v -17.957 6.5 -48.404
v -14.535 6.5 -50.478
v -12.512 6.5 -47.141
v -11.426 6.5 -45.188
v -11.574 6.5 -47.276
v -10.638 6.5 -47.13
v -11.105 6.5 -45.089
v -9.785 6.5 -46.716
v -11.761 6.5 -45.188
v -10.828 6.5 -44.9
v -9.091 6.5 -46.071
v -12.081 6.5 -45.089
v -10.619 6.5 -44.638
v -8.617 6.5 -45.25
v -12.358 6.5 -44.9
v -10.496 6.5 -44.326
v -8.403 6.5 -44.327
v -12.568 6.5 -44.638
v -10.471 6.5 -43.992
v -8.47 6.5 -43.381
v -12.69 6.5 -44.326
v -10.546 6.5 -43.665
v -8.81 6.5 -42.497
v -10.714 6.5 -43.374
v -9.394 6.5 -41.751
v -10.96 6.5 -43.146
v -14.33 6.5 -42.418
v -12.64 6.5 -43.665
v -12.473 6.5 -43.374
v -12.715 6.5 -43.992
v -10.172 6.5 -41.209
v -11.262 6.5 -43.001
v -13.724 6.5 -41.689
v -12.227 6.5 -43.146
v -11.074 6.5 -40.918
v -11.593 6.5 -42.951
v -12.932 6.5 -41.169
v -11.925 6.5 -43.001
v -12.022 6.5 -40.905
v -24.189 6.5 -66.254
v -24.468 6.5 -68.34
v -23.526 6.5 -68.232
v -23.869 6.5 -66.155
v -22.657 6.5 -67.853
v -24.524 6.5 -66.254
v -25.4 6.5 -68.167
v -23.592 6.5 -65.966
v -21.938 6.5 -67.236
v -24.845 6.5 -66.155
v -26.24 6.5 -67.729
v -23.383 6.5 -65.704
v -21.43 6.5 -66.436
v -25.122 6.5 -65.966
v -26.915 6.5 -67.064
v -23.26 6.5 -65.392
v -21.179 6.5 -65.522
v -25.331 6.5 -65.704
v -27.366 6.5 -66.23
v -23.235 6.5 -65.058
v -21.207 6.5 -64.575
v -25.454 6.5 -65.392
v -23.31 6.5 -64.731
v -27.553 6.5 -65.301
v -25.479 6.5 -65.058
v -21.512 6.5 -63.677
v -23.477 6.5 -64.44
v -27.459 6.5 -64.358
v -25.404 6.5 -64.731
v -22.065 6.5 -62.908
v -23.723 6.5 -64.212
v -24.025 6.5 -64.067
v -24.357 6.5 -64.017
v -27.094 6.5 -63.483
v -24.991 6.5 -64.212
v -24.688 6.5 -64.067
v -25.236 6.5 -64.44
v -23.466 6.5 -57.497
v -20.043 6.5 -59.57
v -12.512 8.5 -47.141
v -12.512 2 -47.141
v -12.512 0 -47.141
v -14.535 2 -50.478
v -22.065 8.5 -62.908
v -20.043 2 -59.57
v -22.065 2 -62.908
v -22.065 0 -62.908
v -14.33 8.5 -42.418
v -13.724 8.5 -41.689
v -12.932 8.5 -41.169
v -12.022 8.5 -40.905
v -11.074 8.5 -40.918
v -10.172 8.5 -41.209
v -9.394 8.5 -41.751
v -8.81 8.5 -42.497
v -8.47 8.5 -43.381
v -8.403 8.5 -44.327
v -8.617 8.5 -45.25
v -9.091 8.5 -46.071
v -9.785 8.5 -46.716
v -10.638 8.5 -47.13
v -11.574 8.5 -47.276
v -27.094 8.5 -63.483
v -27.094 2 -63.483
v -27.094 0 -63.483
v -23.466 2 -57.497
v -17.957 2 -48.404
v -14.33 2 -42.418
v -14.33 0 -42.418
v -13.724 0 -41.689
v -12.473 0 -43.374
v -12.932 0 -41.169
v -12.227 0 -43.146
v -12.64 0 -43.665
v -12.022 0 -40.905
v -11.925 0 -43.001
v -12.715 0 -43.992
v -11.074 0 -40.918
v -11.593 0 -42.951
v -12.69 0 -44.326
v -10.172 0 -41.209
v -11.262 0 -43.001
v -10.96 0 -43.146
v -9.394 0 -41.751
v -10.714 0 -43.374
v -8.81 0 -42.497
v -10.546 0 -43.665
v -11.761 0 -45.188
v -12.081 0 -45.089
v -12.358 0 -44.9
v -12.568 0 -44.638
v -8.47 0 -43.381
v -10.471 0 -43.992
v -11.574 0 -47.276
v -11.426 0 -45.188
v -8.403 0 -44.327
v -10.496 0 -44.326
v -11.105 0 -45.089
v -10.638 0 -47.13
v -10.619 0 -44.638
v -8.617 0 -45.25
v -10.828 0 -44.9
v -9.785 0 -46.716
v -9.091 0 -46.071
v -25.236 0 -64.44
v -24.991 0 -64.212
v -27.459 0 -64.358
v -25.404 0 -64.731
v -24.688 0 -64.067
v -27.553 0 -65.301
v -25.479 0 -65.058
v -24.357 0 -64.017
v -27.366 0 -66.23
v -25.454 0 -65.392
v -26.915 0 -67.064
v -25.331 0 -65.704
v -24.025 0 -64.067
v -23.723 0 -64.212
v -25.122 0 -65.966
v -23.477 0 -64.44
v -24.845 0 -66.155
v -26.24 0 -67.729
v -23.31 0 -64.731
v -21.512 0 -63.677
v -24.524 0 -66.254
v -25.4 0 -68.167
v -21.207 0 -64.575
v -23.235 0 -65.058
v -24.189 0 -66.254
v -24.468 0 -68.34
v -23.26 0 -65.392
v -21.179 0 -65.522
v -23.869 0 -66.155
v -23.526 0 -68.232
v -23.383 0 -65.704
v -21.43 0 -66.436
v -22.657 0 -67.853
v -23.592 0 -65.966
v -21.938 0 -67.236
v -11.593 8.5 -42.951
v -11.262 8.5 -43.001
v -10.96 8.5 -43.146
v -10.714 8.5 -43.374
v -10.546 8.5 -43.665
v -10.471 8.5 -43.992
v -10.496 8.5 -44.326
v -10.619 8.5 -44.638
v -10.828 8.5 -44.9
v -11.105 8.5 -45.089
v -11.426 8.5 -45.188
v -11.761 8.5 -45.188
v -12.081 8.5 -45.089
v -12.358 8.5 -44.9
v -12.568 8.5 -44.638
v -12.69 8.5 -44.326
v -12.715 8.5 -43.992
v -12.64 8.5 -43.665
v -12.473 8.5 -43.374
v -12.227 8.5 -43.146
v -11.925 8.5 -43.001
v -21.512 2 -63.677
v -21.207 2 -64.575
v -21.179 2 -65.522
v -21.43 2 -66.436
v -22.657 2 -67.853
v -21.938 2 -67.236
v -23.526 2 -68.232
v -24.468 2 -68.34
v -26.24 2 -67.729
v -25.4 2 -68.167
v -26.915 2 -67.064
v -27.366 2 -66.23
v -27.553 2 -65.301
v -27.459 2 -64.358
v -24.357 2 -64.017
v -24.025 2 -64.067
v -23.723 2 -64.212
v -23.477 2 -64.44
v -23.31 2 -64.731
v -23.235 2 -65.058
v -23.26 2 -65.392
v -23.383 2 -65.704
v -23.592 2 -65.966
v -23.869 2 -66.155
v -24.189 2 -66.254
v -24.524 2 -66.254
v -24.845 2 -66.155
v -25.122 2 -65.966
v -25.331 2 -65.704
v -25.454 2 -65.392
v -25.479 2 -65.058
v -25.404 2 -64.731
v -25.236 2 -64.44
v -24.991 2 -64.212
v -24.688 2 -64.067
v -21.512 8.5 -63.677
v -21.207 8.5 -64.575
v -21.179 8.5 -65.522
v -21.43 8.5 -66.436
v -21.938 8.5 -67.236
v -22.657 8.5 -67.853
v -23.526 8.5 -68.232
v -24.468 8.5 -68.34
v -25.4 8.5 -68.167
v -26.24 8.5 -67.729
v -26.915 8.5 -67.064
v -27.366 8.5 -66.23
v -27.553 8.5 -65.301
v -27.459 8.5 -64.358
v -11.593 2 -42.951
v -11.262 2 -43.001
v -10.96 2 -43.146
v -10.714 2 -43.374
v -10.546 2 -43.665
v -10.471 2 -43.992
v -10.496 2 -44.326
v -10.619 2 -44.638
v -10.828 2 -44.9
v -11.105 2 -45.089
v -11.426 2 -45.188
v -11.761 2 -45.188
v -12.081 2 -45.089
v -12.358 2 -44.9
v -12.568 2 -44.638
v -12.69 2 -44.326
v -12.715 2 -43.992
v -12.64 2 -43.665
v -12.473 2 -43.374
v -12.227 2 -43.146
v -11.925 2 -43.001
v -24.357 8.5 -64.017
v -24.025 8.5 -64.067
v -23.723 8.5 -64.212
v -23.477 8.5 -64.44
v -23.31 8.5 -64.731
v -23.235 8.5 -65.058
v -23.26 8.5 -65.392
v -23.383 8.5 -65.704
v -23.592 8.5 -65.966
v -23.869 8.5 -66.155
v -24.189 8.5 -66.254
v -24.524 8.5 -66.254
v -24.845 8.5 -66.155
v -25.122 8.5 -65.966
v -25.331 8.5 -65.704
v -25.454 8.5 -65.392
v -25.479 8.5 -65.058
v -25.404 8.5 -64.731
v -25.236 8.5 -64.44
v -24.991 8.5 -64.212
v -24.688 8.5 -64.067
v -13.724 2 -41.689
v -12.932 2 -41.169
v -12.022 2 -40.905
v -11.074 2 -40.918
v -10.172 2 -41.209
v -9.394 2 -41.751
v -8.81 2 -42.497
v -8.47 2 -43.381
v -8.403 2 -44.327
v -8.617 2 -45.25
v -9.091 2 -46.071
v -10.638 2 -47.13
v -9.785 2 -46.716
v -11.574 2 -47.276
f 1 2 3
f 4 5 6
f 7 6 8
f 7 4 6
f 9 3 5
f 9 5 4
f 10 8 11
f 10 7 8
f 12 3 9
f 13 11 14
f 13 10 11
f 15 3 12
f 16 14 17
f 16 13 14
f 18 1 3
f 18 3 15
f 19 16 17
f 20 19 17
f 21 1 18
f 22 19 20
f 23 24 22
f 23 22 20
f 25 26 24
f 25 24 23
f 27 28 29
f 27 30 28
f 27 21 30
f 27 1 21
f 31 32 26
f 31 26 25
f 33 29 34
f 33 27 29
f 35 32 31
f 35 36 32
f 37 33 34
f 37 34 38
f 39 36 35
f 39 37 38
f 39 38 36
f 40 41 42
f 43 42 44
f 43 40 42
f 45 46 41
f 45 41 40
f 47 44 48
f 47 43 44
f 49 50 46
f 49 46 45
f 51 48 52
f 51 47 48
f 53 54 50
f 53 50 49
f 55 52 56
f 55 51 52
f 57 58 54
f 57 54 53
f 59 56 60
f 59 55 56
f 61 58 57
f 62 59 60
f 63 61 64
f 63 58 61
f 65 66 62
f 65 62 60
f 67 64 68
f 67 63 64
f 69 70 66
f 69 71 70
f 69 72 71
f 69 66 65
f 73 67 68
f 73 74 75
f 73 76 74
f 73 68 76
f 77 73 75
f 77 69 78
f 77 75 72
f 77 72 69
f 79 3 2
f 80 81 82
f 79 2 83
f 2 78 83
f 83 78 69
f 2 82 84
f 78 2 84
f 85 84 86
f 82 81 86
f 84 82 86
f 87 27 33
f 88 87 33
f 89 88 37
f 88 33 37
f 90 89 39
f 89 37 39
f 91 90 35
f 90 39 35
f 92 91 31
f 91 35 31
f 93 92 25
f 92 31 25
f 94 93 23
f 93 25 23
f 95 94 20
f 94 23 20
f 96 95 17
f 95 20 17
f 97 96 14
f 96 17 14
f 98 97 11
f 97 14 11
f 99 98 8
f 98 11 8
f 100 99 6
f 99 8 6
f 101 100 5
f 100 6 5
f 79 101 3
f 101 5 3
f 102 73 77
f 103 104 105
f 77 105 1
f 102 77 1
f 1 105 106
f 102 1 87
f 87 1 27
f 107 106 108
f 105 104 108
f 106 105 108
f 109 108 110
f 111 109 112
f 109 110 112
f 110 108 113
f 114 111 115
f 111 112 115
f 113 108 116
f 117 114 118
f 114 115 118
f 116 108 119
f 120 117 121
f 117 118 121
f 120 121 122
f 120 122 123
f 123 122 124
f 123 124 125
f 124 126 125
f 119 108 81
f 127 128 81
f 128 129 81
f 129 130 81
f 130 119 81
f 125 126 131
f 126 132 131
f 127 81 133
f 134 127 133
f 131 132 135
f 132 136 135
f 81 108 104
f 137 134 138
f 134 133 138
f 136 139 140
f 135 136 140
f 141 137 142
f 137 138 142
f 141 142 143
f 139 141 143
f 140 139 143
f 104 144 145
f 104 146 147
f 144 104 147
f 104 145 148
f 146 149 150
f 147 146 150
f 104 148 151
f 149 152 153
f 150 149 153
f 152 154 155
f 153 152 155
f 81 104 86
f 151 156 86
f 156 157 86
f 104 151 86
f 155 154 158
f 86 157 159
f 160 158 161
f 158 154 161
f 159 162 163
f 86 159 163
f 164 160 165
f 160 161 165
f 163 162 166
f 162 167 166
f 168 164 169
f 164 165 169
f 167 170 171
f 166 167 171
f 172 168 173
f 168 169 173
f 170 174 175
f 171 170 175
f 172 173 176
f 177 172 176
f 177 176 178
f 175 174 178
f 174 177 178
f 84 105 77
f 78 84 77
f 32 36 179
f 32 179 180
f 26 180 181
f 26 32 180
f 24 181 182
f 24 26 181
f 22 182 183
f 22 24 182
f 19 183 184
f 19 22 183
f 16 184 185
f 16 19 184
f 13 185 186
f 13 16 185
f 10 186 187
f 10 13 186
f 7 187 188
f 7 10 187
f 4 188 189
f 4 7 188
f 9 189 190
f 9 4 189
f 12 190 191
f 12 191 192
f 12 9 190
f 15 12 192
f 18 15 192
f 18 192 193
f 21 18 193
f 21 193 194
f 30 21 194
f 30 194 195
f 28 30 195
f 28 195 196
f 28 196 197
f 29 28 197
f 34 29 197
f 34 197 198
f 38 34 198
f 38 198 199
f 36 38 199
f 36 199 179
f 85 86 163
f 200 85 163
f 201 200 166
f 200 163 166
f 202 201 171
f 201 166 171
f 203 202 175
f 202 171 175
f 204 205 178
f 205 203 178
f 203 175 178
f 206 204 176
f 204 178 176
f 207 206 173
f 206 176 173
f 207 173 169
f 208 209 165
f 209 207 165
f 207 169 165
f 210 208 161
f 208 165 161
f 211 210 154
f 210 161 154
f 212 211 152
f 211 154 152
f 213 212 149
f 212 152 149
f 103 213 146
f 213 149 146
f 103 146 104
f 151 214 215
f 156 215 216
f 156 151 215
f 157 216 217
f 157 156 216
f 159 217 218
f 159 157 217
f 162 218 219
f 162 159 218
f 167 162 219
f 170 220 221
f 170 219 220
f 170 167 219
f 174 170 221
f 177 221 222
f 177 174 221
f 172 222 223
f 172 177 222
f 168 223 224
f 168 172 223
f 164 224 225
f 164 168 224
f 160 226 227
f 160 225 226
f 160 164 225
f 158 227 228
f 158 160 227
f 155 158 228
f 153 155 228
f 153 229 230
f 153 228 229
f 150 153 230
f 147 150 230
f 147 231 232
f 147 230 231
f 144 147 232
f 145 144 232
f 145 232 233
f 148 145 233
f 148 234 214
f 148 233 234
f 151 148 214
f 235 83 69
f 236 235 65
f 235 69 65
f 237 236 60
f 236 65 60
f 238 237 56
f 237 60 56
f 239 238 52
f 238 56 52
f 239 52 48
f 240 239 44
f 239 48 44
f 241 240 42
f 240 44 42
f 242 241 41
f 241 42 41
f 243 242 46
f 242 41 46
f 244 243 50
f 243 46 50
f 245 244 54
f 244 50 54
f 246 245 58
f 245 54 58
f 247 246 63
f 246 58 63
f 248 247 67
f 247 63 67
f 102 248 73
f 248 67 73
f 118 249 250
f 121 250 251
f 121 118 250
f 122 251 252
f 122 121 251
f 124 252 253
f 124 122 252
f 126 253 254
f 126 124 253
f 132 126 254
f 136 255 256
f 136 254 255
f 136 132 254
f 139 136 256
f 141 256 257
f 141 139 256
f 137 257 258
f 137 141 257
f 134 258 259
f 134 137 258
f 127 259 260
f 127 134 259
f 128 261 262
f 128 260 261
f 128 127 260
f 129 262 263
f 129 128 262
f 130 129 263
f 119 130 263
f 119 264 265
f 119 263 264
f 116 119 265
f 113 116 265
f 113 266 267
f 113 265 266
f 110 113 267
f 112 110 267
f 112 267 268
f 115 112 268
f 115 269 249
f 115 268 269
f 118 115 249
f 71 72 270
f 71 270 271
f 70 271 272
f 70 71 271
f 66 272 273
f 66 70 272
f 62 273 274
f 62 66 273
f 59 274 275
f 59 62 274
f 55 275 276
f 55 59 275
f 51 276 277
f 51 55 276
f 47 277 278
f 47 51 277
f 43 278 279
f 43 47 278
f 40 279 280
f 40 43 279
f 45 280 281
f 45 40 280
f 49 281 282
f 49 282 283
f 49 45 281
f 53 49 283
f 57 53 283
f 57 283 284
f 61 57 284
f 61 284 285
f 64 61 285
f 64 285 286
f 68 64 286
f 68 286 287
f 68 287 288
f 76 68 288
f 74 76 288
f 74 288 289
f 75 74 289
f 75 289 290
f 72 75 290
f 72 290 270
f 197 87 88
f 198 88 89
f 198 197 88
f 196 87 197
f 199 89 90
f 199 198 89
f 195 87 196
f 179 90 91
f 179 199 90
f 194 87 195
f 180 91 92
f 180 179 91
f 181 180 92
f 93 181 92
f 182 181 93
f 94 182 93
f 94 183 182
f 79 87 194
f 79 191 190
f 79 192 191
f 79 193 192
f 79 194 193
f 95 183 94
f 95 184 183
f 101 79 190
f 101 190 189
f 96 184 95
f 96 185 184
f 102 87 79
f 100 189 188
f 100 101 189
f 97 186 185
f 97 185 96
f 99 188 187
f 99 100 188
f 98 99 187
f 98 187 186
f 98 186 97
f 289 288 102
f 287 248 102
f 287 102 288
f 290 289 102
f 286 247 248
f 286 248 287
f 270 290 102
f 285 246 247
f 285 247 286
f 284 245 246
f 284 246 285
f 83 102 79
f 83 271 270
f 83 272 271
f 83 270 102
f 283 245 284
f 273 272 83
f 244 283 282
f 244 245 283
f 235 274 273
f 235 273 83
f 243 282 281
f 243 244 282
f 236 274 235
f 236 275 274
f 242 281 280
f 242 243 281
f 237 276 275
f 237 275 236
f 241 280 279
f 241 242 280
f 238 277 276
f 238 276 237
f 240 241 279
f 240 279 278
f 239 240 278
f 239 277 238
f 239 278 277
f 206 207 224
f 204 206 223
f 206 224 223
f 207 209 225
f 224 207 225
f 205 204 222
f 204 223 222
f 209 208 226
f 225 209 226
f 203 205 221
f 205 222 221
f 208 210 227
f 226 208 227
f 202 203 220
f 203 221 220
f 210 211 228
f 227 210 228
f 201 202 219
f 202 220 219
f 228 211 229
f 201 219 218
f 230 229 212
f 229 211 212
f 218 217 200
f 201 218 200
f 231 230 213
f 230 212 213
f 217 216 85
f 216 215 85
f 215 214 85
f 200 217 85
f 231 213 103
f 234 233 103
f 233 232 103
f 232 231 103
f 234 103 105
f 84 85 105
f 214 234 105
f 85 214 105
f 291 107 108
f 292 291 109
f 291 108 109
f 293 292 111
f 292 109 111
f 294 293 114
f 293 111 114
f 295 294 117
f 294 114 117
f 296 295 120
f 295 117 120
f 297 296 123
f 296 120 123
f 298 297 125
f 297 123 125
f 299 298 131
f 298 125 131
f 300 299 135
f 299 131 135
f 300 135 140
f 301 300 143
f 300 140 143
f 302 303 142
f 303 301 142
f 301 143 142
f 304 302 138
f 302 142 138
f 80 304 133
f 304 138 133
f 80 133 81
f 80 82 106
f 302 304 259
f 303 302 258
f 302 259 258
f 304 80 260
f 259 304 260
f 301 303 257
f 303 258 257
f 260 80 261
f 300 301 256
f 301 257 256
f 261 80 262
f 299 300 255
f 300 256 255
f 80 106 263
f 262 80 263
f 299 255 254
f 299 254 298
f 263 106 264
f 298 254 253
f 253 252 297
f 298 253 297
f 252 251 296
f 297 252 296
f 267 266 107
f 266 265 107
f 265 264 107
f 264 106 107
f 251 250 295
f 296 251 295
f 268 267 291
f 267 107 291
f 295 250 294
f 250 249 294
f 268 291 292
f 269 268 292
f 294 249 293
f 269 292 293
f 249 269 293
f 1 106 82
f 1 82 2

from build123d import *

# Parameters (mm, degrees)
SKETCH1_R           = 1.125
BOSS_EXTRUDE5_DEPTH = 8.5
SKETCH3_W           = 15.998285444
SKETCH3_H           = 4.5
SKETCH3_W_2         = 14.781977404
CUT_EXTRUDE1_DEPTH  = 8.5


with BuildPart() as part:
    # Sketch1 → Boss-Extrude5 (new body)
    with BuildSketch(Plane(origin=(0, 0, 0), x_dir=(1, 0, 0), z_dir=(0, 1, 0))):
        with BuildLine():
            Line((-27.093662294, 63.483418595), (-14.330111131, 42.417509095))
            ThreePointArc((-14.330111131, 42.417509095), (-8.606773323, 42.92644123), (-12.512429784, 47.140875379))
            Line((-12.512429784, 47.140875379), (-22.065450081, 62.90788712))
            ThreePointArc((-22.065450081, 62.90788712), (-23.992920625, 68.320877504), (-27.093662294, 63.483418595))
        make_face()
        with Locations(Location((-24.356818103, 65.141635672, 0), (0, 0, 270))):
            Circle(SKETCH1_R, mode=Mode.SUBTRACT)
        with Locations(Location((-11.59326694, 44.075726171, 0), (0, 0, 270))):
            Circle(SKETCH1_R, mode=Mode.SUBTRACT)
    extrude(amount=BOSS_EXTRUDE5_DEPTH)

    # Sketch3 → Cut-Extrude1 (cut)
    with BuildSketch(Plane(origin=(8.31694784, 0, -5.039126807), x_dir=(0.518192836351311, 0, 0.855263809800335), z_dir=(-0.8552638098003349, 0, 0.5181928363513109))):
        with Locations((-69.33395488, 4.25)):
            Rectangle(SKETCH3_W, SKETCH3_H)
        with Locations((-43.312932661, 4.25)):
            Rectangle(SKETCH3_W_2, SKETCH3_H)
    extrude(amount=-CUT_EXTRUDE1_DEPTH, mode=Mode.SUBTRACT)


solid = part.part
